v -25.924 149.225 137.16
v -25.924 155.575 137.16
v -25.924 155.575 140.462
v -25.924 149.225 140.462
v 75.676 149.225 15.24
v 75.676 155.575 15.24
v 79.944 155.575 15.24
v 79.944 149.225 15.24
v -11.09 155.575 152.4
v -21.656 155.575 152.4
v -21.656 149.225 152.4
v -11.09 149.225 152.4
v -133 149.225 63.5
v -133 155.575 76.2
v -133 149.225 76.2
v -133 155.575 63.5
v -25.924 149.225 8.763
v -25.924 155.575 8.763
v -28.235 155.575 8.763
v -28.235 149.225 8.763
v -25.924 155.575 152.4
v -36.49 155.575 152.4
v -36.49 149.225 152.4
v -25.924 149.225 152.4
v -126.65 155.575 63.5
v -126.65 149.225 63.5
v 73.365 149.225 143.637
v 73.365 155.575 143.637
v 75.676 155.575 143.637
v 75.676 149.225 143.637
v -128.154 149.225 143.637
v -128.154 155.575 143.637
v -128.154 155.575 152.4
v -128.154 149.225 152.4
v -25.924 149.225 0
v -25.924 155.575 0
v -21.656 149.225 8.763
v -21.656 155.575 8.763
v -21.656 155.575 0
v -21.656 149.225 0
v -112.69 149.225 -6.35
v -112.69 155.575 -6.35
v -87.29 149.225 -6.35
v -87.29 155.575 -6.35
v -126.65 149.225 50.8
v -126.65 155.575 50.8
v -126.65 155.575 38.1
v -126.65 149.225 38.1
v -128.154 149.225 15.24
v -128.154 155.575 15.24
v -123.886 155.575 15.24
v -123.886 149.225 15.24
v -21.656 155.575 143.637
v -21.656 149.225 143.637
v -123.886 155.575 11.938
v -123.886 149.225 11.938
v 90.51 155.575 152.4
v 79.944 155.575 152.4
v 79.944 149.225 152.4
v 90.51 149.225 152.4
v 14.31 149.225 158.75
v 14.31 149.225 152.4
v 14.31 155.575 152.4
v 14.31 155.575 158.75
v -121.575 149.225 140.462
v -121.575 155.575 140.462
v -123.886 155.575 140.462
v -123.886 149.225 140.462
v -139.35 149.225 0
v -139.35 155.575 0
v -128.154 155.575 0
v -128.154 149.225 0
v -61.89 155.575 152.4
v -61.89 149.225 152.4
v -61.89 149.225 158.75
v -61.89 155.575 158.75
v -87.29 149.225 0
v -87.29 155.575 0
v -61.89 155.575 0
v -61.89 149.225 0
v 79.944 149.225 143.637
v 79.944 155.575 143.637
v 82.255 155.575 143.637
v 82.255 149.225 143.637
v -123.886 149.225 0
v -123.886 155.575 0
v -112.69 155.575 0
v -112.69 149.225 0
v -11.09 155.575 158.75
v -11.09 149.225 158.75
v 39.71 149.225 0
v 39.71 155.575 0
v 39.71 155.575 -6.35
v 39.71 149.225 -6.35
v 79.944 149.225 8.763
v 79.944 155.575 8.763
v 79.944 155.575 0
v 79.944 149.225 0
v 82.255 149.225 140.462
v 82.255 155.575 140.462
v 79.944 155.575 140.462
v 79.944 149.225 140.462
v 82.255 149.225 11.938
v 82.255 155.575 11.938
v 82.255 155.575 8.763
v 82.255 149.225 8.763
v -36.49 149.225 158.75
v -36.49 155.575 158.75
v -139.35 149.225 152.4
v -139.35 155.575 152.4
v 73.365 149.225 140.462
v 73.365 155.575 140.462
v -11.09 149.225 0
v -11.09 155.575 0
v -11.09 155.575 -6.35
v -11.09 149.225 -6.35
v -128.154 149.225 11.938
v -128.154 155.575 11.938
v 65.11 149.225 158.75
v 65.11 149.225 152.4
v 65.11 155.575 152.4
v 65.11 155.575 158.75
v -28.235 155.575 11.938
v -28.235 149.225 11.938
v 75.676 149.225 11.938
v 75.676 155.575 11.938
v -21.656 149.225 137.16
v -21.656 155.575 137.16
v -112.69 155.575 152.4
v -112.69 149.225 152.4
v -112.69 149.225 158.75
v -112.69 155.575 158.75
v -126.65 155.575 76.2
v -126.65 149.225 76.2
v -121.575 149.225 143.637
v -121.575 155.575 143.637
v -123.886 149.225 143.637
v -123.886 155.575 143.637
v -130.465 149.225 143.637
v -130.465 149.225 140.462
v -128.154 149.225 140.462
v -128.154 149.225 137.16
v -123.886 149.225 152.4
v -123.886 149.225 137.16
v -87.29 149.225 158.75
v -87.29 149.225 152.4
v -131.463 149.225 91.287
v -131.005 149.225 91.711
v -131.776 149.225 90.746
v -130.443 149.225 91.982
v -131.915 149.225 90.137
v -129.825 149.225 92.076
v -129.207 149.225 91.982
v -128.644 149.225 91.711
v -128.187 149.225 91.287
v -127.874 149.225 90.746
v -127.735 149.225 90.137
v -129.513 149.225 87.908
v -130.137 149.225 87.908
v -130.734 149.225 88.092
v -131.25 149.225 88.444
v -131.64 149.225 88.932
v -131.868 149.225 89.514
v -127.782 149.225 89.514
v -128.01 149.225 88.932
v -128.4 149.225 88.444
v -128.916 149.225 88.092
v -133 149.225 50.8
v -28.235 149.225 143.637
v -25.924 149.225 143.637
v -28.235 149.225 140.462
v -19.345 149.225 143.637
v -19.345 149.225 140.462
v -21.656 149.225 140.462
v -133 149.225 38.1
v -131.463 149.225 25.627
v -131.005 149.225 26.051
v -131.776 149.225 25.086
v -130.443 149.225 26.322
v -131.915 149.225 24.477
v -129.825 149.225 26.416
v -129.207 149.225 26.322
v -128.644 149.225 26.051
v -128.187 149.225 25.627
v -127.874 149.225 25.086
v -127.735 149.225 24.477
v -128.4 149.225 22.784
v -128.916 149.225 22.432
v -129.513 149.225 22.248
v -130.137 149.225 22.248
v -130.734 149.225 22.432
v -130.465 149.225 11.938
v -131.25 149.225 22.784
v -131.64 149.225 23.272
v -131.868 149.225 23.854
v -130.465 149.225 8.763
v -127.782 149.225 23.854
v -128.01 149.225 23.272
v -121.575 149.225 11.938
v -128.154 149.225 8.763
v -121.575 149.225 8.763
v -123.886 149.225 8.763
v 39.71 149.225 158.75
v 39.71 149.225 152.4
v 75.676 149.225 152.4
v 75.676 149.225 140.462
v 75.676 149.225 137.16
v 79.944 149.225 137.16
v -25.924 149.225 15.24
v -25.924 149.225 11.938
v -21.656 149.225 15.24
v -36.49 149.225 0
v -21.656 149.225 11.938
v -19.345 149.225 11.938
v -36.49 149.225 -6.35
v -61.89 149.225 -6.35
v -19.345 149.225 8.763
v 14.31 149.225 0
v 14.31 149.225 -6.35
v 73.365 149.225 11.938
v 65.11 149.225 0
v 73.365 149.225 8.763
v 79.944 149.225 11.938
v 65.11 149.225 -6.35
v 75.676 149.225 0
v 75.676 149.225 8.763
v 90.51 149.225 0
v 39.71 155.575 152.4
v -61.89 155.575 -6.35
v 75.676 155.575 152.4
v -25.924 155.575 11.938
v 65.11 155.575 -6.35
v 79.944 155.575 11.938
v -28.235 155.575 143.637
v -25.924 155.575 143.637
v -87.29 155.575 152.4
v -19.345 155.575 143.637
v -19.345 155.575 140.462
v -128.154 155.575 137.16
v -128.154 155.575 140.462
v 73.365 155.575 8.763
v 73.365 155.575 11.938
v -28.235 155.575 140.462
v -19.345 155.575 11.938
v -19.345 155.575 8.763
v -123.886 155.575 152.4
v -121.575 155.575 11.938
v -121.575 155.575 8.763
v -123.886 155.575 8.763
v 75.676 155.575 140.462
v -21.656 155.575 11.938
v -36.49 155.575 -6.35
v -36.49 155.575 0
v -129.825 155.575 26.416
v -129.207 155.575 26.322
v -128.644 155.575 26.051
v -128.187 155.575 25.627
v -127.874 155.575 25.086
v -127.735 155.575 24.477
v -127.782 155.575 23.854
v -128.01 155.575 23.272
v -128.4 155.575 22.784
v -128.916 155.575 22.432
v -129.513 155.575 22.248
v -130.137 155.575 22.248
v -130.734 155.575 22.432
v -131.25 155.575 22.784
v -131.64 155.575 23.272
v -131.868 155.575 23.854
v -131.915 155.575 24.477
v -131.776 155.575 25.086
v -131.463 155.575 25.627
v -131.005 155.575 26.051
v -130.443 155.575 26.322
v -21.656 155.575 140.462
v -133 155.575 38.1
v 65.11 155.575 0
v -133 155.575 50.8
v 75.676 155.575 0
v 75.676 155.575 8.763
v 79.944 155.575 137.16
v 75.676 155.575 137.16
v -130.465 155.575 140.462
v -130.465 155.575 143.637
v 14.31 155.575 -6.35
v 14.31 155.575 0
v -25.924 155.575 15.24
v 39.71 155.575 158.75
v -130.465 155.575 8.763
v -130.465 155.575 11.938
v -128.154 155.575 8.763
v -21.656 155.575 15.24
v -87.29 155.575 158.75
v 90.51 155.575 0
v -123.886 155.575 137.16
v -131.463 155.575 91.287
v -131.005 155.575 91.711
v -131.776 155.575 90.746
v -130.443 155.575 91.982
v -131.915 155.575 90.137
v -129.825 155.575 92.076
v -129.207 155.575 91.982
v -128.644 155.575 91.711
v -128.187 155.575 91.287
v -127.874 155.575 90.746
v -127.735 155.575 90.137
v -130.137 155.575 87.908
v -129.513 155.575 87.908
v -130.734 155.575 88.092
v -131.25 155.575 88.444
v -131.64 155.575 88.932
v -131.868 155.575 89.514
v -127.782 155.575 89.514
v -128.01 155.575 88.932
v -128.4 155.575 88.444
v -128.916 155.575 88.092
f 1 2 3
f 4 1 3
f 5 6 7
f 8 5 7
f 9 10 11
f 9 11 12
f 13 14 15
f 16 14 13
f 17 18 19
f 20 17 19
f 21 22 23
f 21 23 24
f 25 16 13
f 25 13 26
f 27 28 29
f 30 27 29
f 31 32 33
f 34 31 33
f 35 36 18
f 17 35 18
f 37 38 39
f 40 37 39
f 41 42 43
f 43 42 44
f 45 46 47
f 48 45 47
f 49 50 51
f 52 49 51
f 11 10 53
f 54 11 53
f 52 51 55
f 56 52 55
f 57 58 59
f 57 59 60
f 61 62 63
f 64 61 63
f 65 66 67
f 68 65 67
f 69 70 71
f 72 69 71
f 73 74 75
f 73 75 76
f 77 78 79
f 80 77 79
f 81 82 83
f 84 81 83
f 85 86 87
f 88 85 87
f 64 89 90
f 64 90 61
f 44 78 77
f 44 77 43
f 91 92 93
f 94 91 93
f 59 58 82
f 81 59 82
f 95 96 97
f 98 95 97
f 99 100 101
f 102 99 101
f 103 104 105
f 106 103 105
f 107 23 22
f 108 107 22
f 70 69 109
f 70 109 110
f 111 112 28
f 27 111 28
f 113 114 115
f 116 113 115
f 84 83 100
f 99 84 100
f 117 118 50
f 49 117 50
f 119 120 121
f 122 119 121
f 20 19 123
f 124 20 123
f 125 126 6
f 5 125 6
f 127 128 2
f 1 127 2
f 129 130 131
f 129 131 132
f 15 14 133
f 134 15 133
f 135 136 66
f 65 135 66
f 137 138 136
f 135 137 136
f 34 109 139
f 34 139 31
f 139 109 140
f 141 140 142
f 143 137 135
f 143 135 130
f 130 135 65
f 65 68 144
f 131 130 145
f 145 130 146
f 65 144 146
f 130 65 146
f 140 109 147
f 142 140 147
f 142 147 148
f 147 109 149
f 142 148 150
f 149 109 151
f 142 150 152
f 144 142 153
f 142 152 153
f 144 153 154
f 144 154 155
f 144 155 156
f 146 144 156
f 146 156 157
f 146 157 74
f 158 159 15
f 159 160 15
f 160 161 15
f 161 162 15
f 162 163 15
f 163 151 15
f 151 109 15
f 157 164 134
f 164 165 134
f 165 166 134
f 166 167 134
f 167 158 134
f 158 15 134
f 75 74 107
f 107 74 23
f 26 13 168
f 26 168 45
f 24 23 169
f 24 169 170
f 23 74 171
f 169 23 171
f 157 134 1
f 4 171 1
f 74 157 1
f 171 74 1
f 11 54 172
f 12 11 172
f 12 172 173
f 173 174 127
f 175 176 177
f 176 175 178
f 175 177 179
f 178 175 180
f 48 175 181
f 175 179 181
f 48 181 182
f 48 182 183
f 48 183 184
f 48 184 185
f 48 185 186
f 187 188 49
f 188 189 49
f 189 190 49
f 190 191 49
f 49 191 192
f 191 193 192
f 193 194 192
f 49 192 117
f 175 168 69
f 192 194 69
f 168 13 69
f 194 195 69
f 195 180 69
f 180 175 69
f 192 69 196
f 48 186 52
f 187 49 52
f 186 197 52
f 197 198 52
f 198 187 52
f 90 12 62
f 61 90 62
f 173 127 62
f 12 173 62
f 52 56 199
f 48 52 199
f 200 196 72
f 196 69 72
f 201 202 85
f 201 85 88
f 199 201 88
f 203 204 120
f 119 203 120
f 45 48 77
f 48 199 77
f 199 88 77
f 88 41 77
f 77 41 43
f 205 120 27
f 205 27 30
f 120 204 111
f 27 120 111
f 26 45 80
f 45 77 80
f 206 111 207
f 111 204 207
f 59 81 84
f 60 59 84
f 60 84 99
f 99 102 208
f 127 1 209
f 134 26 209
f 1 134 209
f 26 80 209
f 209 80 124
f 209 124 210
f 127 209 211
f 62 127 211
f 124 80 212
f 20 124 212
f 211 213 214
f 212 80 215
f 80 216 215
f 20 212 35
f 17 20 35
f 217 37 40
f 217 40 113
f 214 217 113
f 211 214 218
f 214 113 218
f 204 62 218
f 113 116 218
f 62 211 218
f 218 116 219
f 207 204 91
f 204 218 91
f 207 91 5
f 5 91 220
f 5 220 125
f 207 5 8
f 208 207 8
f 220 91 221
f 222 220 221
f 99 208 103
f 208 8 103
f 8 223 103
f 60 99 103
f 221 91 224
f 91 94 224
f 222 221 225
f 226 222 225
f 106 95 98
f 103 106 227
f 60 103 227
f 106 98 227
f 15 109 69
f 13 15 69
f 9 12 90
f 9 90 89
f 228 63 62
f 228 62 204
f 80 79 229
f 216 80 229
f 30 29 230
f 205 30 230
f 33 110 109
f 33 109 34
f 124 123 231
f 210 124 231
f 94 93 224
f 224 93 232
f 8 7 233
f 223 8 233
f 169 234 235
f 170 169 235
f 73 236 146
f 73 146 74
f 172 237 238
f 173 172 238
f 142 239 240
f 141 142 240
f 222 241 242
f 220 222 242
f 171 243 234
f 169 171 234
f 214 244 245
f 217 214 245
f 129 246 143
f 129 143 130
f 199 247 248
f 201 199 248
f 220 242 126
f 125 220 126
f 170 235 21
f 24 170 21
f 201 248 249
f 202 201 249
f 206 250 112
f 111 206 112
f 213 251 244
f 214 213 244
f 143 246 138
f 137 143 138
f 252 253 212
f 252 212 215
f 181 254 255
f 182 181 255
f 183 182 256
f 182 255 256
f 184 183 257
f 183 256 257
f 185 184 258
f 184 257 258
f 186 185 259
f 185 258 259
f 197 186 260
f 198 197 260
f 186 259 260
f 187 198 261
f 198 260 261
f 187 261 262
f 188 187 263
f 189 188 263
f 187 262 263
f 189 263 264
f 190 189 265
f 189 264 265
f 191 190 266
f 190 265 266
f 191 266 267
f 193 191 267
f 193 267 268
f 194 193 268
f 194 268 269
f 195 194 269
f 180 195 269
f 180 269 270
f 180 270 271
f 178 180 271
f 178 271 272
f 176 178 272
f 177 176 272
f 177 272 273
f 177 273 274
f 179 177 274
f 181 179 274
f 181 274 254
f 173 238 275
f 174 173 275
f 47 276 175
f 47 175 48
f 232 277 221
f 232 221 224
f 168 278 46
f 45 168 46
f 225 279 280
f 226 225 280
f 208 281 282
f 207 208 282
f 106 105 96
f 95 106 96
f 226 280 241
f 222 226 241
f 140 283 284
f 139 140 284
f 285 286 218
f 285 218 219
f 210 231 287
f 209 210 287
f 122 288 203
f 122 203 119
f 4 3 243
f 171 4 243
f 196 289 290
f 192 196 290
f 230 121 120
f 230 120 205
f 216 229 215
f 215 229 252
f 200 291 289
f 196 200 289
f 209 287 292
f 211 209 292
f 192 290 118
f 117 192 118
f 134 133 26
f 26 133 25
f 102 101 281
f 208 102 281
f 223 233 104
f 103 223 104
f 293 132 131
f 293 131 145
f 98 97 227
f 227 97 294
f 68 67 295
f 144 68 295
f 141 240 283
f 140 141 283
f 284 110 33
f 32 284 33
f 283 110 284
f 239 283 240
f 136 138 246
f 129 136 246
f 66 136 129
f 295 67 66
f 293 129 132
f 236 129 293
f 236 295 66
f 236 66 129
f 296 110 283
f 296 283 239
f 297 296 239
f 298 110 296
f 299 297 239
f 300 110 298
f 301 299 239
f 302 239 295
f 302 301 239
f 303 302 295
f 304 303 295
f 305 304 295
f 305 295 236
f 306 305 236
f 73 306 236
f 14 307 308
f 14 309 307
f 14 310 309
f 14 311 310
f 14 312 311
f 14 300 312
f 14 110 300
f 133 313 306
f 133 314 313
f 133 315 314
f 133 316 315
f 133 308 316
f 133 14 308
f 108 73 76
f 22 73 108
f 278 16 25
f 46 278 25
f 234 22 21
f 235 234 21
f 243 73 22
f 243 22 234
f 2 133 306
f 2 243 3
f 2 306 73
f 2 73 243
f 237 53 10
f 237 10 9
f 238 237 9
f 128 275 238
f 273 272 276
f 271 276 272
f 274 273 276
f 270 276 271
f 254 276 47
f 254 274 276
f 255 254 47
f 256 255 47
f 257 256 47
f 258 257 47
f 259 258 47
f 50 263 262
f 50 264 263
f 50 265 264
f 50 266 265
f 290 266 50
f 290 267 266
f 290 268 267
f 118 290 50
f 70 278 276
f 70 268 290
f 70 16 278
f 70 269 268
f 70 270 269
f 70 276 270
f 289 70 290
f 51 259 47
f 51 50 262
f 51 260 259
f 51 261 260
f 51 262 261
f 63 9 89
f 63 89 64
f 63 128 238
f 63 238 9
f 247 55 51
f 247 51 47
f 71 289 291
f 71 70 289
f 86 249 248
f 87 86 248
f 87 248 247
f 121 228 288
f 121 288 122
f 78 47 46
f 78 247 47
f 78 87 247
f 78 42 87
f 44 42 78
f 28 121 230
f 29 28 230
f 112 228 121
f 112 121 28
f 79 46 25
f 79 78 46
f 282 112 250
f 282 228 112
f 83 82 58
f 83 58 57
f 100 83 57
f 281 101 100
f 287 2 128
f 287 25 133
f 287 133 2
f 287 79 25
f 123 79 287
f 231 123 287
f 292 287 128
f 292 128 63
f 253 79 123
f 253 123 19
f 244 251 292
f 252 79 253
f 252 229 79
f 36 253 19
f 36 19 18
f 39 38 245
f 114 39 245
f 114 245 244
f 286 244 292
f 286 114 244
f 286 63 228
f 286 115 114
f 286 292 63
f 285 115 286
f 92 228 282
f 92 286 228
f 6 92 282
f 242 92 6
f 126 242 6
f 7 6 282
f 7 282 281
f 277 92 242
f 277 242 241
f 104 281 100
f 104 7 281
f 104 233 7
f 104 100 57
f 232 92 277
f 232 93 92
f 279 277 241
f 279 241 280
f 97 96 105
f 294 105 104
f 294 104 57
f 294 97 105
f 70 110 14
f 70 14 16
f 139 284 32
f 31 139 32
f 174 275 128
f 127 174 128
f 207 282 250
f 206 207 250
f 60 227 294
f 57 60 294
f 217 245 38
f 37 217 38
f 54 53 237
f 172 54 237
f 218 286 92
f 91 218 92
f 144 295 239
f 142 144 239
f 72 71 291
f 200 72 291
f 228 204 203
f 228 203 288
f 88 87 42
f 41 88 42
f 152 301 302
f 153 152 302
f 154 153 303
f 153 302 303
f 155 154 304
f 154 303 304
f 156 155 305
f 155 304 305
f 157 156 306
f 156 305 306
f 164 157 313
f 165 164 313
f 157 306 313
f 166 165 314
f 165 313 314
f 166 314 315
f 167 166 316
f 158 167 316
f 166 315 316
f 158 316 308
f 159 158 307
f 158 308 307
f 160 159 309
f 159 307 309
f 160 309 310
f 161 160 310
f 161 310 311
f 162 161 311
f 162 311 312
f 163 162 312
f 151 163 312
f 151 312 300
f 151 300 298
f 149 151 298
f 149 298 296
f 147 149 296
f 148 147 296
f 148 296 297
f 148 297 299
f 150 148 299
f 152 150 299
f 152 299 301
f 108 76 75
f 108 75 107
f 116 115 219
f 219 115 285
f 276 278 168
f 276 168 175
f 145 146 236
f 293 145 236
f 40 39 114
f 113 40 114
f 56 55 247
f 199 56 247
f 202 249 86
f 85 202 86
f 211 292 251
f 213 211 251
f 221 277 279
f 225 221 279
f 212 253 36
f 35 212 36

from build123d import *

# Parameters (mm, degrees)
SKETCH1_W           = 229.859874896
SKETCH1_H           = 6.35
BOSS_EXTRUDE1_DEPTH = 152.4
SKETCH2_W           = 25.4
SKETCH2_H           = 6.35
BOSS_EXTRUDE2_DEPTH = 6.35
LPATTERN1_COUNT     = 4
LPATTERN1_PITCH     = 50.8
SKETCH3_W           = 25.4
SKETCH3_H           = 6.35
BOSS_EXTRUDE3_DEPTH = 6.35
LPATTERN2_COUNT     = 4
LPATTERN2_PITCH     = 50.8
CUT_EXTRUDE1_DEPTH  = 6.35
SKETCH5_W           = 6.35
SKETCH5_H           = 12.7
CUT_EXTRUDE2_DEPTH  = 212.329778686
SKETCH6_R           = 2.0955
CUT_EXTRUDE3_DEPTH  = 212.329778686


with BuildPart() as part:
    # Sketch1 → Boss-Extrude1 (new body)
    with BuildSketch(Plane.XY):
        with Locations((-24.419947229, 152.4)):
            Rectangle(SKETCH1_W, SKETCH1_H)
    extrude(amount=BOSS_EXTRUDE1_DEPTH)

    # Sketch2 → Boss-Extrude2 (add)
    with BuildSketch(Plane(origin=(0, 155.575, 0), x_dir=(1, 0, 0), z_dir=(0, 1, 0))):
        with Locations((52.409990219, 3.175)):
            Rectangle(SKETCH2_W, SKETCH2_H)
    boss_extrude2 = extrude(amount=-BOSS_EXTRUDE2_DEPTH)

    # LPattern1: Boss-Extrude2 ×4
    with Locations(*[(-i * LPATTERN1_PITCH, 0, 0) for i in range(1, LPATTERN1_COUNT)]):
        add(boss_extrude2)

    # Sketch3 → Boss-Extrude3 (add)
    with BuildSketch(Plane.XY.offset(152.4)):
        with Locations((52.409990219, 152.4)):
            Rectangle(SKETCH3_W, SKETCH3_H)
    boss_extrude3 = extrude(amount=BOSS_EXTRUDE3_DEPTH)

    # LPattern2: Boss-Extrude3 ×4
    with Locations(*[(-i * LPATTERN2_PITCH, 0, 0) for i in range(1, LPATTERN2_COUNT)]):
        add(boss_extrude3)

    # Sketch4 → Cut-Extrude1 (cut)
    with BuildSketch(Plane(origin=(0, 155.575, 0), x_dir=(1, 0, 0), z_dir=(0, 1, 0))):
        Polygon((-123.886347229, 0), (-128.153547229, 0), (-128.153547229, -8.763), (-130.464947229, -8.763), (-130.464947229, -11.938), (-128.153547229, -11.938), (-128.153547229, -15.24), (-123.886347229, -15.24), (-123.886347229, -11.938), (-121.574947229, -11.938), (-121.574947229, -8.763), (-123.886347229, -8.763), align=None)
        Polygon((-21.656409781, 0), (-25.923609781, 0), (-25.923609781, -8.763), (-28.235009781, -8.763), (-28.235009781, -11.938), (-25.923609781, -11.938), (-25.923609781, -15.24), (-21.656409781, -15.24), (-21.656409781, -11.938), (-19.345009781, -11.938), (-19.345009781, -8.763), (-21.656409781, -8.763), align=None)
        Polygon((79.943590219, 0), (75.676390219, 0), (75.676390219, -8.763), (73.364990219, -8.763), (73.364990219, -11.938), (75.676390219, -11.938), (75.676390219, -15.24), (79.943590219, -15.24), (79.943590219, -11.938), (82.254990219, -11.938), (82.254990219, -8.763), (79.943590219, -8.763), align=None)
        Polygon((-128.153547229, -152.4), (-123.886347229, -152.4), (-123.886347229, -143.637), (-121.574947229, -143.637), (-121.574947229, -140.462), (-123.886347229, -140.462), (-123.886347229, -137.16), (-128.153547229, -137.16), (-128.153547229, -140.462), (-130.464947229, -140.462), (-130.464947229, -143.637), (-128.153547229, -143.637), align=None)
        Polygon((-25.923609781, -152.4), (-21.656409781, -152.4), (-21.656409781, -143.637), (-19.345009781, -143.637), (-19.345009781, -140.462), (-21.656409781, -140.462), (-21.656409781, -137.16), (-25.923609781, -137.16), (-25.923609781, -140.462), (-28.235009781, -140.462), (-28.235009781, -143.637), (-25.923609781, -143.637), align=None)
        Polygon((75.676390219, -152.4), (79.943590219, -152.4), (79.943590219, -143.637), (82.254990219, -143.637), (82.254990219, -140.462), (79.943590219, -140.462), (79.943590219, -137.16), (75.676390219, -137.16), (75.676390219, -140.462), (73.364990219, -140.462), (73.364990219, -143.637), (75.676390219, -143.637), align=None)
    extrude(amount=-CUT_EXTRUDE1_DEPTH, mode=Mode.SUBTRACT)

    # Sketch5 → Cut-Extrude2 (cut, through all)
    with BuildSketch(Plane(origin=(0, 155.575, 0), x_dir=(1, 0, 0), z_dir=(0, 1, 0))):
        with Locations((-129.824884677, -44.45)):
            Rectangle(SKETCH5_W, SKETCH5_H)
        with Locations((-129.824884677, -69.85)):
            Rectangle(SKETCH5_W, SKETCH5_H)
    extrude(amount=-CUT_EXTRUDE2_DEPTH, mode=Mode.SUBTRACT)

    # Sketch6 → Cut-Extrude3 (cut, through all)
    with BuildSketch(Plane(origin=(0, 155.575, 0), x_dir=(1, 0, 0), z_dir=(0, 1, 0))):
        with Locations(Location((-129.824884677, -89.98, 0), (0, 0, 270))):
            Circle(SKETCH6_R)
        with Locations(Location((-129.824884677, -24.32, 0), (0, 0, 270))):
            Circle(SKETCH6_R)
    extrude(amount=-CUT_EXTRUDE3_DEPTH, mode=Mode.SUBTRACT)


solid = part.part
